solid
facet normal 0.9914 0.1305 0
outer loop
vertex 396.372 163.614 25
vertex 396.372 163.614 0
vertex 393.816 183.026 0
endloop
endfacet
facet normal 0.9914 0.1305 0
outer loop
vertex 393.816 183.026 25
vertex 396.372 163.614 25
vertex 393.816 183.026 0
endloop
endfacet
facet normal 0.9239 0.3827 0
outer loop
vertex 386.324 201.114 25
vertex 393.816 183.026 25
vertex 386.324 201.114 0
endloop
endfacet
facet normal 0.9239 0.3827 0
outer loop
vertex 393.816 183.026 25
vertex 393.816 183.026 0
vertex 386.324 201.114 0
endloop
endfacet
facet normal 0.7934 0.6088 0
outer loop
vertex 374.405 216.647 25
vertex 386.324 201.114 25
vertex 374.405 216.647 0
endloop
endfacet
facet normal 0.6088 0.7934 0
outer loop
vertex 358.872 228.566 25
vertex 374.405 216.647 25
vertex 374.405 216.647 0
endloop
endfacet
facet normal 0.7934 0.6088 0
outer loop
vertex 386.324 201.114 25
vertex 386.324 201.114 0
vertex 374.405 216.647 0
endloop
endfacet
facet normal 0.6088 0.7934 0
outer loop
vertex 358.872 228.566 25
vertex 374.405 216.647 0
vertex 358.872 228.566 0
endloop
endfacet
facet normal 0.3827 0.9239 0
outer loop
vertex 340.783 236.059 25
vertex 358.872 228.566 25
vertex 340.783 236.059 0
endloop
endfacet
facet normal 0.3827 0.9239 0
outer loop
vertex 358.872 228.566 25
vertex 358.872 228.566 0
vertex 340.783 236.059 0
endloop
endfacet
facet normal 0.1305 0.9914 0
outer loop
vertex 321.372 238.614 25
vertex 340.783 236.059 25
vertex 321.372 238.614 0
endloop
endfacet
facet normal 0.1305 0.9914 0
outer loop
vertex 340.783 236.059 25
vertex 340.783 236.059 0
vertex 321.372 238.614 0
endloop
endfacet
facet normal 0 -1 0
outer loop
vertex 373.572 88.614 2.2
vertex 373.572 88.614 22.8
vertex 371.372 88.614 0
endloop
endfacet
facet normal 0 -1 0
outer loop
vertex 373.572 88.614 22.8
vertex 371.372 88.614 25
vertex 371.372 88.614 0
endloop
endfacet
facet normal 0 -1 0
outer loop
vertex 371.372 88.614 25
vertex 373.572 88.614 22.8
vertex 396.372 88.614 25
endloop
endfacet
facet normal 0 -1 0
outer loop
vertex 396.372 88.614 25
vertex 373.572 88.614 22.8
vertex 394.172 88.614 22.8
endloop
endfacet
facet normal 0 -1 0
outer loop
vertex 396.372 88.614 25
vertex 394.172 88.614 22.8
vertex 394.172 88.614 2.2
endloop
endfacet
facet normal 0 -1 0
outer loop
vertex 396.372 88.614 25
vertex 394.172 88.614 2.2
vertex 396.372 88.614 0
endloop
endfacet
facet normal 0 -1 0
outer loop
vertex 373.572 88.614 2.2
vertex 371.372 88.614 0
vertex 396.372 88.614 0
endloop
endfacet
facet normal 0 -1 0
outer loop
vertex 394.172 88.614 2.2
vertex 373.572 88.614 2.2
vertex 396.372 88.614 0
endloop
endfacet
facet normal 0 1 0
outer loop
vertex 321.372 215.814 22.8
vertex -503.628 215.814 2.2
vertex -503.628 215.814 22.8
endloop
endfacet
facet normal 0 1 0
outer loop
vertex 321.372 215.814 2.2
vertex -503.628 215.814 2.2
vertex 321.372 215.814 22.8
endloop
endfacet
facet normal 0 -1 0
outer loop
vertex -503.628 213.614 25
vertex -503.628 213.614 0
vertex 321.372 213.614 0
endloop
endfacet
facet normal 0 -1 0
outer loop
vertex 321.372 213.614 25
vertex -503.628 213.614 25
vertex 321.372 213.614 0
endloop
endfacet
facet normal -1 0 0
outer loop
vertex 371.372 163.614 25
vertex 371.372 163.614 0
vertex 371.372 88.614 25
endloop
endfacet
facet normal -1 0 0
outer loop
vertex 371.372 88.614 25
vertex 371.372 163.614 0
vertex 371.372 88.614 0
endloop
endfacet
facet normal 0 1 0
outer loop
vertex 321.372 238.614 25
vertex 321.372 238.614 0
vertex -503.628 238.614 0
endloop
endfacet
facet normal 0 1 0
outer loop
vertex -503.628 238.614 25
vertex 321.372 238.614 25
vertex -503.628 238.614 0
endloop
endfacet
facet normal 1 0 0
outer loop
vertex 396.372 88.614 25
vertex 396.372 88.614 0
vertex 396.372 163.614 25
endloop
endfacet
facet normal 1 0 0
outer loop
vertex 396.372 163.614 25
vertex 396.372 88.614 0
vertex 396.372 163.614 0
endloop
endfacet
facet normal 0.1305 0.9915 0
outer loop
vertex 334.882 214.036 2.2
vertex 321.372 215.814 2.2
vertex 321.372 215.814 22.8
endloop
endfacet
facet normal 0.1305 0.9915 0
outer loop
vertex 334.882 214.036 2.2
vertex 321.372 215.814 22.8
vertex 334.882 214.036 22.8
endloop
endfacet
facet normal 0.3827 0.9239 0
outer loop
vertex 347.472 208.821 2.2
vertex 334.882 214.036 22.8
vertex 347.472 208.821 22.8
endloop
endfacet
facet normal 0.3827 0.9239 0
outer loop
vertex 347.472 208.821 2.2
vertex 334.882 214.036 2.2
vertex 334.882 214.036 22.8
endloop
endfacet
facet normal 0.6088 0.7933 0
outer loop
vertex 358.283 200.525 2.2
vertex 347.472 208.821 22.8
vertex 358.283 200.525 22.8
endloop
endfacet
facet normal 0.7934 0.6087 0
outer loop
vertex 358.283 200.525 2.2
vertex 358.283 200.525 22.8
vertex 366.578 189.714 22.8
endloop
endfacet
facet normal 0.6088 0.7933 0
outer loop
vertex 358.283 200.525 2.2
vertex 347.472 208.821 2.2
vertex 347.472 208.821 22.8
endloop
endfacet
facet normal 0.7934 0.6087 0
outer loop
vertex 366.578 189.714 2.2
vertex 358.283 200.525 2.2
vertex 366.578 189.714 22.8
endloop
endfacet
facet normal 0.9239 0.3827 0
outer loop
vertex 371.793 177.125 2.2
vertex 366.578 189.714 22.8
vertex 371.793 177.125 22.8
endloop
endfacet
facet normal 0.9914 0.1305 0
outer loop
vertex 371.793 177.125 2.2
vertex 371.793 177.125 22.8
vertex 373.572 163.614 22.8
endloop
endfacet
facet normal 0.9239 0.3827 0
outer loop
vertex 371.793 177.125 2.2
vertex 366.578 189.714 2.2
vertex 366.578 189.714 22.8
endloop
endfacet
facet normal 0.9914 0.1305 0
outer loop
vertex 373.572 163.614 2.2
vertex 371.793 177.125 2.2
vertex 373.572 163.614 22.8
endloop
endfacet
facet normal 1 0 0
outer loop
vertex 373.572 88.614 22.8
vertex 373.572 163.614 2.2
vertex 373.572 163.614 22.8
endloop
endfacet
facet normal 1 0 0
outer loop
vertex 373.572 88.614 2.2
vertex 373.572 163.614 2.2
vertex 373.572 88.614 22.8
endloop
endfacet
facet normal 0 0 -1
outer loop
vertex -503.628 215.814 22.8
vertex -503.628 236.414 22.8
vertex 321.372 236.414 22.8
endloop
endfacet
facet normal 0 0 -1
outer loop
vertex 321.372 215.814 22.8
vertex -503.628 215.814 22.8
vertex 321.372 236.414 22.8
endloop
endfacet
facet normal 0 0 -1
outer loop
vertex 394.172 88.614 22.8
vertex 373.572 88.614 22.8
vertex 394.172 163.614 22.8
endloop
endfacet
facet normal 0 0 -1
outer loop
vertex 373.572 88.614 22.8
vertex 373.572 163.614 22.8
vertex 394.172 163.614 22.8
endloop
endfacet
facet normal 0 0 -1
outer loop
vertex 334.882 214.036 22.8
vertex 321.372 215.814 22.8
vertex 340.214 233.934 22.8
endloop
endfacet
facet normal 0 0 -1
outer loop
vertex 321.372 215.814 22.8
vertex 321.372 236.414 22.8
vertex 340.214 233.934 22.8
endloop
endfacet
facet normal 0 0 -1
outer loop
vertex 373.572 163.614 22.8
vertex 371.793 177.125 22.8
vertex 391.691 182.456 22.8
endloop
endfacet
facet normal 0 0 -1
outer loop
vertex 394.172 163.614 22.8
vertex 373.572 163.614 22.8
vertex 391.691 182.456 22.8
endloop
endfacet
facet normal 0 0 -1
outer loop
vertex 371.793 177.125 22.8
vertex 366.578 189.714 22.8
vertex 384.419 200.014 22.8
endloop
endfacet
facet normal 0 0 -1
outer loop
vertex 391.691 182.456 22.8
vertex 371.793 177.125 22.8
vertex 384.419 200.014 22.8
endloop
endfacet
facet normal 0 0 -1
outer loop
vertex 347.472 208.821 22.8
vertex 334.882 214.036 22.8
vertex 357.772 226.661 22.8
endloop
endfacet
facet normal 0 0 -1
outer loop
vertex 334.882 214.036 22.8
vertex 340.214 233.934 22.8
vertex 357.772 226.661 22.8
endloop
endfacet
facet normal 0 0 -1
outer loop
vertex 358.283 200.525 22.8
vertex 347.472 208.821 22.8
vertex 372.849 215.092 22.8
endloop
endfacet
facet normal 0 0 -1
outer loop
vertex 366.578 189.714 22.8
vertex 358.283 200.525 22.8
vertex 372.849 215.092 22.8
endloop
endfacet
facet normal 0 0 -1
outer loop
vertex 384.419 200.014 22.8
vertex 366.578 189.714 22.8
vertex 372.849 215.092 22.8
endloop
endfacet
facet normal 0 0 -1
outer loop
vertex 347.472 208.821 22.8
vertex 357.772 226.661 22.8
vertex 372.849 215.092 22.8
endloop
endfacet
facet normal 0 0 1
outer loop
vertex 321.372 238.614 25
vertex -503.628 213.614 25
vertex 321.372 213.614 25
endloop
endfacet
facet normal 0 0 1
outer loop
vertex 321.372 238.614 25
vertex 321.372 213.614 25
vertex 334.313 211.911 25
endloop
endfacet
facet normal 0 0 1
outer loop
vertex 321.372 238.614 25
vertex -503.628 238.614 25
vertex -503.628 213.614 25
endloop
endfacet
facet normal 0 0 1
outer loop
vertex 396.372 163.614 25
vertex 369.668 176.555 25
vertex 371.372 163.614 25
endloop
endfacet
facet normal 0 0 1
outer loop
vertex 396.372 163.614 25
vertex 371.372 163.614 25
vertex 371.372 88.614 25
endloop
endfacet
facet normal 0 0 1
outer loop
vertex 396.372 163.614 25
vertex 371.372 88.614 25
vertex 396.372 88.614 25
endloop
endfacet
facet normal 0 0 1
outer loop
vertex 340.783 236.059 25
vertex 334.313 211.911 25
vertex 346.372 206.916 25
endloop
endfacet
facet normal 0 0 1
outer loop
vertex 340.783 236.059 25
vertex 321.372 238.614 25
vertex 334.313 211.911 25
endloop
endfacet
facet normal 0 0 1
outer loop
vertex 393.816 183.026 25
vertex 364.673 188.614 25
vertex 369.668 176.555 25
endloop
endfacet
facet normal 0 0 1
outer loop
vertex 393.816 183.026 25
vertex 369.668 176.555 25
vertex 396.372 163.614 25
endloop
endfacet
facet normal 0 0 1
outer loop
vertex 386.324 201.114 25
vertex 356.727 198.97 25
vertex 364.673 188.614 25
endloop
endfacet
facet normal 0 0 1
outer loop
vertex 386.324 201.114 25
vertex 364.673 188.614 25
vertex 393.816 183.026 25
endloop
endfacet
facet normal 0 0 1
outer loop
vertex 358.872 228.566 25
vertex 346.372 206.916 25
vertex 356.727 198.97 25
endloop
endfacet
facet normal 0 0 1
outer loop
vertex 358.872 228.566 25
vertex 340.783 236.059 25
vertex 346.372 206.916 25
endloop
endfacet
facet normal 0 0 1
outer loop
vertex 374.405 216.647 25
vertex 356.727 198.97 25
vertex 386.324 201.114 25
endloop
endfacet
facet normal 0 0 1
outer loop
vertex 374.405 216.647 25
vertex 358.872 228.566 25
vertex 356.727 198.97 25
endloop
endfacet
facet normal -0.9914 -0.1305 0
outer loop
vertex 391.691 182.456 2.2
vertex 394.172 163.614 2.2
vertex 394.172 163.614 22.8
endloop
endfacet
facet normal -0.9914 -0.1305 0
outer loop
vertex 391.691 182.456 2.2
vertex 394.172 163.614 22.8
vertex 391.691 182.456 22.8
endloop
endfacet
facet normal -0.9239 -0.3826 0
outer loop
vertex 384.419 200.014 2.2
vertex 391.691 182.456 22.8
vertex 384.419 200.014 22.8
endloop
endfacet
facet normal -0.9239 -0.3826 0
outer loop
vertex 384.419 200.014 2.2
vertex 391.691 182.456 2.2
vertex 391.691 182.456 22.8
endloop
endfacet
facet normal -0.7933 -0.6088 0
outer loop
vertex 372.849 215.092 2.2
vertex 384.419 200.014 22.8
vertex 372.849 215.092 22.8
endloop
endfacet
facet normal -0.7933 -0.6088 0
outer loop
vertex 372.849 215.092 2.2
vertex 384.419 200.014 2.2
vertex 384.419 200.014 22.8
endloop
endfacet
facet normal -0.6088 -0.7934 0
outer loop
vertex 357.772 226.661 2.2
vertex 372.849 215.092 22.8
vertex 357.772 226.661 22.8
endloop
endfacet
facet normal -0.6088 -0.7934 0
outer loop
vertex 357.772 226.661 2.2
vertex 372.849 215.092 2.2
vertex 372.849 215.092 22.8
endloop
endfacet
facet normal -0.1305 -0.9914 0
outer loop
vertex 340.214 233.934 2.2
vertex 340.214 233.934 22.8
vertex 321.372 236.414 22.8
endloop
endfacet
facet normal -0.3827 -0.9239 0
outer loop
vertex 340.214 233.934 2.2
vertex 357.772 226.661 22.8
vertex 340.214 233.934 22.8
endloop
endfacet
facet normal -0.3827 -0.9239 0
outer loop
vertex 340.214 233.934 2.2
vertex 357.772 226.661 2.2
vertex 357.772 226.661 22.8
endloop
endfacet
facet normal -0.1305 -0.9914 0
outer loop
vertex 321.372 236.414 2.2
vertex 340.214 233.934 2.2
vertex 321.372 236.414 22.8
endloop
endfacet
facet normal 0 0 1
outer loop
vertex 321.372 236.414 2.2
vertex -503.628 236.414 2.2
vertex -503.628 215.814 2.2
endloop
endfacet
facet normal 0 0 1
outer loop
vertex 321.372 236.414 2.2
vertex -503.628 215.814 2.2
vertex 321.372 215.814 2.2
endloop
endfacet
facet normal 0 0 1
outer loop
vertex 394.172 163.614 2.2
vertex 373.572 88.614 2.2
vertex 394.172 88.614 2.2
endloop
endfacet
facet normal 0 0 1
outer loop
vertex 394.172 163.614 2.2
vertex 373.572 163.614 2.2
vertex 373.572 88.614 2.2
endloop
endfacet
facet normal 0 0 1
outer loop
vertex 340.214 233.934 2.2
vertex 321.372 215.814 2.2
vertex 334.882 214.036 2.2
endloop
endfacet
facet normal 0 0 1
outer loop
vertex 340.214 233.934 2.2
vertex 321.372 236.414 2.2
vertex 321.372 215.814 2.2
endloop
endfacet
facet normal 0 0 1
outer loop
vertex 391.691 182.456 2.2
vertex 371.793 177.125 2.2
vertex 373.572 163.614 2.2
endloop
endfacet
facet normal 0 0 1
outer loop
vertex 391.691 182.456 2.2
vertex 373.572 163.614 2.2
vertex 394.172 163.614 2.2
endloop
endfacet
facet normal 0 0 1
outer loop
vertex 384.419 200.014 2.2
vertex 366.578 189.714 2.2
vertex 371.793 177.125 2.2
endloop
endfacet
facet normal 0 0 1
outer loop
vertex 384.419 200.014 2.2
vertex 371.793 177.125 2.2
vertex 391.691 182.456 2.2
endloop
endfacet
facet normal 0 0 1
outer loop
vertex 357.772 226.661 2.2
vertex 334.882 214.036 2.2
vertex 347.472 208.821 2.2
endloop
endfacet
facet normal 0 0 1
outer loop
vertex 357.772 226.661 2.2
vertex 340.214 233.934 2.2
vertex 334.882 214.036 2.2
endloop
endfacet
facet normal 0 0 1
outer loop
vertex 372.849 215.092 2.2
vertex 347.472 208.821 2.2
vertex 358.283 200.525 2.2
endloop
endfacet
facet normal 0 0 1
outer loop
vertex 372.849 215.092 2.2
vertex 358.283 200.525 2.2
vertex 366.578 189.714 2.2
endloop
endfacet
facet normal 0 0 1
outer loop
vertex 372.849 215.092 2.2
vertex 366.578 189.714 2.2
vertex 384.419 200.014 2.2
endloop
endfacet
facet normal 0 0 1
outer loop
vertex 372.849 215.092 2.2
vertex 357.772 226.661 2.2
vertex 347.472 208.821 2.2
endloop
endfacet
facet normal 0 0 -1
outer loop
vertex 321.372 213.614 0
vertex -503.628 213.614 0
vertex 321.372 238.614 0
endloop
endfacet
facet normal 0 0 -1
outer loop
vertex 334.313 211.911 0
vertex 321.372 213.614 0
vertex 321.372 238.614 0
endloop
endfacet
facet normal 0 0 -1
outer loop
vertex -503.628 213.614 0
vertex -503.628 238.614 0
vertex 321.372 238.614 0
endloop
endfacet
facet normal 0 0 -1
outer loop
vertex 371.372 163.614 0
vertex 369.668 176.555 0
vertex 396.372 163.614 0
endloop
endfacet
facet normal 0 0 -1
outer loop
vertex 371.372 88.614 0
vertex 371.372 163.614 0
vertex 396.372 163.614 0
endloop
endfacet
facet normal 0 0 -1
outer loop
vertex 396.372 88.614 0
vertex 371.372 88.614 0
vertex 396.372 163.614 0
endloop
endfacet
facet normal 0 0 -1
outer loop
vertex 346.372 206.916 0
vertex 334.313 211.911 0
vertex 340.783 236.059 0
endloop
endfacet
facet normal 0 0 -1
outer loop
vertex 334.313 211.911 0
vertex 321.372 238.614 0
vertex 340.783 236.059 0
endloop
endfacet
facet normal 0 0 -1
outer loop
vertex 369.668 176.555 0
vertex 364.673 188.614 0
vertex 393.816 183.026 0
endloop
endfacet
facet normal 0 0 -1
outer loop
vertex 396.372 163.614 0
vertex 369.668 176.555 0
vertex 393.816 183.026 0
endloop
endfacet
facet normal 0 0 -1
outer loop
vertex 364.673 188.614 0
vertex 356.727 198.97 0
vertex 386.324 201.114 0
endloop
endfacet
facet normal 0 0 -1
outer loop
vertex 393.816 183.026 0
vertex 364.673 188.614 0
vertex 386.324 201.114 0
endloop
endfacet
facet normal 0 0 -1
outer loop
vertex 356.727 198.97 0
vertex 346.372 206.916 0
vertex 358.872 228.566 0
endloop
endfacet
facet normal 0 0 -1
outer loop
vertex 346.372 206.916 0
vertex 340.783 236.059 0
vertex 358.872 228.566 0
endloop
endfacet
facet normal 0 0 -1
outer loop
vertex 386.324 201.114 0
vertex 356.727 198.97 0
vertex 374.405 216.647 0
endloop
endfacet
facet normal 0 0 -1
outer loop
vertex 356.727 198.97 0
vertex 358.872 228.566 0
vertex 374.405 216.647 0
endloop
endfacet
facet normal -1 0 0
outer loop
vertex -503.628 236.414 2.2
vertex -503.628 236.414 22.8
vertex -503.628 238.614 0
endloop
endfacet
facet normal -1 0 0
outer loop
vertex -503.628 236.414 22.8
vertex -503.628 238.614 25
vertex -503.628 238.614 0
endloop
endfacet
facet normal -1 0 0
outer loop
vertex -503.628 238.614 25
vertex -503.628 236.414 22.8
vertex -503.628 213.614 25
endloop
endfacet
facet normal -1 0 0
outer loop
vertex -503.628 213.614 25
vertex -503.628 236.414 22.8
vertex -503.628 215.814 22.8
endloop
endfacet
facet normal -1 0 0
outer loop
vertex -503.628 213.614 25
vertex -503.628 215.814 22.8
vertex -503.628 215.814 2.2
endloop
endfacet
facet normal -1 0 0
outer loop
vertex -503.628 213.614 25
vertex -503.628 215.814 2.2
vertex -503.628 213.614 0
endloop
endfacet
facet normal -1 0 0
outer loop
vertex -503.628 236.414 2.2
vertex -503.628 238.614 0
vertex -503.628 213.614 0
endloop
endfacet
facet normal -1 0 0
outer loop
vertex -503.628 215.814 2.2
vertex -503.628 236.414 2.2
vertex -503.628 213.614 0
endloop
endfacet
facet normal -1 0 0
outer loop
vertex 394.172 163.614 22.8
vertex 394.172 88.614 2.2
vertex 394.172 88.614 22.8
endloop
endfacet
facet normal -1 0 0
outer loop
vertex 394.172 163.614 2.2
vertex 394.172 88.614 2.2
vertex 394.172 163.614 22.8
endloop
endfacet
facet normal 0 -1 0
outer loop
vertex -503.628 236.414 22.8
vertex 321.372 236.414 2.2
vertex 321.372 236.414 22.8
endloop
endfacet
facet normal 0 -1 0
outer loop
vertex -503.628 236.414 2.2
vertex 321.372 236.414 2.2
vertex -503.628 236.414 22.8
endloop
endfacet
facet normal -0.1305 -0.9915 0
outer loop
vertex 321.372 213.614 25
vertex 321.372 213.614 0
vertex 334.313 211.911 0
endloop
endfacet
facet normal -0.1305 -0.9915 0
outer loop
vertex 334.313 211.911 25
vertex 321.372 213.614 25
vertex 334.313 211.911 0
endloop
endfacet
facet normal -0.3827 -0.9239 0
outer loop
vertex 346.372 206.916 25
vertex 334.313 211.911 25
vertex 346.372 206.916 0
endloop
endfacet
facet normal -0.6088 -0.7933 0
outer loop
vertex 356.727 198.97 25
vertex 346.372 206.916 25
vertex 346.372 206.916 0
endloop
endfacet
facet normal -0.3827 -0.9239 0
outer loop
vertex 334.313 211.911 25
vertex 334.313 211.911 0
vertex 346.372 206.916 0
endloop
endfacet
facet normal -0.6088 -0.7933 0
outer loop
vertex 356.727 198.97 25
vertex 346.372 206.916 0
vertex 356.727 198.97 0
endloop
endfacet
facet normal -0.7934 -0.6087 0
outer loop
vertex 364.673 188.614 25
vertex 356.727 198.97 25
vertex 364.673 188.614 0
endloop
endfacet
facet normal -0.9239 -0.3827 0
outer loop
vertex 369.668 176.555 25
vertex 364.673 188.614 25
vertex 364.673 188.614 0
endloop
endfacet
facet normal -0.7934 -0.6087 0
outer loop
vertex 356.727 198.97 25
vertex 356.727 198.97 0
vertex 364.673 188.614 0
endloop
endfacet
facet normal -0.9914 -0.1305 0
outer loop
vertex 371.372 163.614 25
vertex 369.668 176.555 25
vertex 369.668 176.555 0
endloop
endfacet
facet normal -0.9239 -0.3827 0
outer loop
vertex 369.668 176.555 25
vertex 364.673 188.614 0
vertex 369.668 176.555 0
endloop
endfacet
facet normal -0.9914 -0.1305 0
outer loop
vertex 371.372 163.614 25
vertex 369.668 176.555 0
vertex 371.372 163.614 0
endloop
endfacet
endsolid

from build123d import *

# Parameters (mm, degrees)
EXTRUDE_1_DEPTH = 25
SHELL_1_T       = -2.2


with BuildPart() as part:
    # Эскиз1 → Бобышка-Вытянуть1 (new body)
    with BuildSketch(Plane.XY):
        with BuildLine():
            Line((-503.628105098, 213.614457831), (321.371894902, 213.614457831))
            ThreePointArc((321.371894902, 213.614457831), (356.727233962, 198.969796891), (371.371894902, 163.614457831))
            Line((371.371894902, 163.614457831), (371.371894902, 88.614457831))
            Line((371.371894902, 88.614457831), (396.371894902, 88.614457831))
            Line((396.371894902, 88.614457831), (396.371894902, 163.614457831))
            ThreePointArc((396.371894902, 163.614457831), (374.404903491, 216.64746642), (321.371894902, 238.614457831))
            Line((321.371894902, 238.614457831), (-503.628105098, 238.614457831))
            Line((-503.628105098, 238.614457831), (-503.628105098, 213.614457831))
        make_face()
    extrude(amount=EXTRUDE_1_DEPTH)

    # Оболочка1
    shell_1_openings = [part.faces().sort_by_distance(p)[0] for p in [
        (383.871894902, 88.614457831, 12.5),
        (-503.628105098, 226.114457831, 12.5),
    ]]
    offset(amount=SHELL_1_T, openings=shell_1_openings, kind=Kind.INTERSECTION)


solid = part.part
